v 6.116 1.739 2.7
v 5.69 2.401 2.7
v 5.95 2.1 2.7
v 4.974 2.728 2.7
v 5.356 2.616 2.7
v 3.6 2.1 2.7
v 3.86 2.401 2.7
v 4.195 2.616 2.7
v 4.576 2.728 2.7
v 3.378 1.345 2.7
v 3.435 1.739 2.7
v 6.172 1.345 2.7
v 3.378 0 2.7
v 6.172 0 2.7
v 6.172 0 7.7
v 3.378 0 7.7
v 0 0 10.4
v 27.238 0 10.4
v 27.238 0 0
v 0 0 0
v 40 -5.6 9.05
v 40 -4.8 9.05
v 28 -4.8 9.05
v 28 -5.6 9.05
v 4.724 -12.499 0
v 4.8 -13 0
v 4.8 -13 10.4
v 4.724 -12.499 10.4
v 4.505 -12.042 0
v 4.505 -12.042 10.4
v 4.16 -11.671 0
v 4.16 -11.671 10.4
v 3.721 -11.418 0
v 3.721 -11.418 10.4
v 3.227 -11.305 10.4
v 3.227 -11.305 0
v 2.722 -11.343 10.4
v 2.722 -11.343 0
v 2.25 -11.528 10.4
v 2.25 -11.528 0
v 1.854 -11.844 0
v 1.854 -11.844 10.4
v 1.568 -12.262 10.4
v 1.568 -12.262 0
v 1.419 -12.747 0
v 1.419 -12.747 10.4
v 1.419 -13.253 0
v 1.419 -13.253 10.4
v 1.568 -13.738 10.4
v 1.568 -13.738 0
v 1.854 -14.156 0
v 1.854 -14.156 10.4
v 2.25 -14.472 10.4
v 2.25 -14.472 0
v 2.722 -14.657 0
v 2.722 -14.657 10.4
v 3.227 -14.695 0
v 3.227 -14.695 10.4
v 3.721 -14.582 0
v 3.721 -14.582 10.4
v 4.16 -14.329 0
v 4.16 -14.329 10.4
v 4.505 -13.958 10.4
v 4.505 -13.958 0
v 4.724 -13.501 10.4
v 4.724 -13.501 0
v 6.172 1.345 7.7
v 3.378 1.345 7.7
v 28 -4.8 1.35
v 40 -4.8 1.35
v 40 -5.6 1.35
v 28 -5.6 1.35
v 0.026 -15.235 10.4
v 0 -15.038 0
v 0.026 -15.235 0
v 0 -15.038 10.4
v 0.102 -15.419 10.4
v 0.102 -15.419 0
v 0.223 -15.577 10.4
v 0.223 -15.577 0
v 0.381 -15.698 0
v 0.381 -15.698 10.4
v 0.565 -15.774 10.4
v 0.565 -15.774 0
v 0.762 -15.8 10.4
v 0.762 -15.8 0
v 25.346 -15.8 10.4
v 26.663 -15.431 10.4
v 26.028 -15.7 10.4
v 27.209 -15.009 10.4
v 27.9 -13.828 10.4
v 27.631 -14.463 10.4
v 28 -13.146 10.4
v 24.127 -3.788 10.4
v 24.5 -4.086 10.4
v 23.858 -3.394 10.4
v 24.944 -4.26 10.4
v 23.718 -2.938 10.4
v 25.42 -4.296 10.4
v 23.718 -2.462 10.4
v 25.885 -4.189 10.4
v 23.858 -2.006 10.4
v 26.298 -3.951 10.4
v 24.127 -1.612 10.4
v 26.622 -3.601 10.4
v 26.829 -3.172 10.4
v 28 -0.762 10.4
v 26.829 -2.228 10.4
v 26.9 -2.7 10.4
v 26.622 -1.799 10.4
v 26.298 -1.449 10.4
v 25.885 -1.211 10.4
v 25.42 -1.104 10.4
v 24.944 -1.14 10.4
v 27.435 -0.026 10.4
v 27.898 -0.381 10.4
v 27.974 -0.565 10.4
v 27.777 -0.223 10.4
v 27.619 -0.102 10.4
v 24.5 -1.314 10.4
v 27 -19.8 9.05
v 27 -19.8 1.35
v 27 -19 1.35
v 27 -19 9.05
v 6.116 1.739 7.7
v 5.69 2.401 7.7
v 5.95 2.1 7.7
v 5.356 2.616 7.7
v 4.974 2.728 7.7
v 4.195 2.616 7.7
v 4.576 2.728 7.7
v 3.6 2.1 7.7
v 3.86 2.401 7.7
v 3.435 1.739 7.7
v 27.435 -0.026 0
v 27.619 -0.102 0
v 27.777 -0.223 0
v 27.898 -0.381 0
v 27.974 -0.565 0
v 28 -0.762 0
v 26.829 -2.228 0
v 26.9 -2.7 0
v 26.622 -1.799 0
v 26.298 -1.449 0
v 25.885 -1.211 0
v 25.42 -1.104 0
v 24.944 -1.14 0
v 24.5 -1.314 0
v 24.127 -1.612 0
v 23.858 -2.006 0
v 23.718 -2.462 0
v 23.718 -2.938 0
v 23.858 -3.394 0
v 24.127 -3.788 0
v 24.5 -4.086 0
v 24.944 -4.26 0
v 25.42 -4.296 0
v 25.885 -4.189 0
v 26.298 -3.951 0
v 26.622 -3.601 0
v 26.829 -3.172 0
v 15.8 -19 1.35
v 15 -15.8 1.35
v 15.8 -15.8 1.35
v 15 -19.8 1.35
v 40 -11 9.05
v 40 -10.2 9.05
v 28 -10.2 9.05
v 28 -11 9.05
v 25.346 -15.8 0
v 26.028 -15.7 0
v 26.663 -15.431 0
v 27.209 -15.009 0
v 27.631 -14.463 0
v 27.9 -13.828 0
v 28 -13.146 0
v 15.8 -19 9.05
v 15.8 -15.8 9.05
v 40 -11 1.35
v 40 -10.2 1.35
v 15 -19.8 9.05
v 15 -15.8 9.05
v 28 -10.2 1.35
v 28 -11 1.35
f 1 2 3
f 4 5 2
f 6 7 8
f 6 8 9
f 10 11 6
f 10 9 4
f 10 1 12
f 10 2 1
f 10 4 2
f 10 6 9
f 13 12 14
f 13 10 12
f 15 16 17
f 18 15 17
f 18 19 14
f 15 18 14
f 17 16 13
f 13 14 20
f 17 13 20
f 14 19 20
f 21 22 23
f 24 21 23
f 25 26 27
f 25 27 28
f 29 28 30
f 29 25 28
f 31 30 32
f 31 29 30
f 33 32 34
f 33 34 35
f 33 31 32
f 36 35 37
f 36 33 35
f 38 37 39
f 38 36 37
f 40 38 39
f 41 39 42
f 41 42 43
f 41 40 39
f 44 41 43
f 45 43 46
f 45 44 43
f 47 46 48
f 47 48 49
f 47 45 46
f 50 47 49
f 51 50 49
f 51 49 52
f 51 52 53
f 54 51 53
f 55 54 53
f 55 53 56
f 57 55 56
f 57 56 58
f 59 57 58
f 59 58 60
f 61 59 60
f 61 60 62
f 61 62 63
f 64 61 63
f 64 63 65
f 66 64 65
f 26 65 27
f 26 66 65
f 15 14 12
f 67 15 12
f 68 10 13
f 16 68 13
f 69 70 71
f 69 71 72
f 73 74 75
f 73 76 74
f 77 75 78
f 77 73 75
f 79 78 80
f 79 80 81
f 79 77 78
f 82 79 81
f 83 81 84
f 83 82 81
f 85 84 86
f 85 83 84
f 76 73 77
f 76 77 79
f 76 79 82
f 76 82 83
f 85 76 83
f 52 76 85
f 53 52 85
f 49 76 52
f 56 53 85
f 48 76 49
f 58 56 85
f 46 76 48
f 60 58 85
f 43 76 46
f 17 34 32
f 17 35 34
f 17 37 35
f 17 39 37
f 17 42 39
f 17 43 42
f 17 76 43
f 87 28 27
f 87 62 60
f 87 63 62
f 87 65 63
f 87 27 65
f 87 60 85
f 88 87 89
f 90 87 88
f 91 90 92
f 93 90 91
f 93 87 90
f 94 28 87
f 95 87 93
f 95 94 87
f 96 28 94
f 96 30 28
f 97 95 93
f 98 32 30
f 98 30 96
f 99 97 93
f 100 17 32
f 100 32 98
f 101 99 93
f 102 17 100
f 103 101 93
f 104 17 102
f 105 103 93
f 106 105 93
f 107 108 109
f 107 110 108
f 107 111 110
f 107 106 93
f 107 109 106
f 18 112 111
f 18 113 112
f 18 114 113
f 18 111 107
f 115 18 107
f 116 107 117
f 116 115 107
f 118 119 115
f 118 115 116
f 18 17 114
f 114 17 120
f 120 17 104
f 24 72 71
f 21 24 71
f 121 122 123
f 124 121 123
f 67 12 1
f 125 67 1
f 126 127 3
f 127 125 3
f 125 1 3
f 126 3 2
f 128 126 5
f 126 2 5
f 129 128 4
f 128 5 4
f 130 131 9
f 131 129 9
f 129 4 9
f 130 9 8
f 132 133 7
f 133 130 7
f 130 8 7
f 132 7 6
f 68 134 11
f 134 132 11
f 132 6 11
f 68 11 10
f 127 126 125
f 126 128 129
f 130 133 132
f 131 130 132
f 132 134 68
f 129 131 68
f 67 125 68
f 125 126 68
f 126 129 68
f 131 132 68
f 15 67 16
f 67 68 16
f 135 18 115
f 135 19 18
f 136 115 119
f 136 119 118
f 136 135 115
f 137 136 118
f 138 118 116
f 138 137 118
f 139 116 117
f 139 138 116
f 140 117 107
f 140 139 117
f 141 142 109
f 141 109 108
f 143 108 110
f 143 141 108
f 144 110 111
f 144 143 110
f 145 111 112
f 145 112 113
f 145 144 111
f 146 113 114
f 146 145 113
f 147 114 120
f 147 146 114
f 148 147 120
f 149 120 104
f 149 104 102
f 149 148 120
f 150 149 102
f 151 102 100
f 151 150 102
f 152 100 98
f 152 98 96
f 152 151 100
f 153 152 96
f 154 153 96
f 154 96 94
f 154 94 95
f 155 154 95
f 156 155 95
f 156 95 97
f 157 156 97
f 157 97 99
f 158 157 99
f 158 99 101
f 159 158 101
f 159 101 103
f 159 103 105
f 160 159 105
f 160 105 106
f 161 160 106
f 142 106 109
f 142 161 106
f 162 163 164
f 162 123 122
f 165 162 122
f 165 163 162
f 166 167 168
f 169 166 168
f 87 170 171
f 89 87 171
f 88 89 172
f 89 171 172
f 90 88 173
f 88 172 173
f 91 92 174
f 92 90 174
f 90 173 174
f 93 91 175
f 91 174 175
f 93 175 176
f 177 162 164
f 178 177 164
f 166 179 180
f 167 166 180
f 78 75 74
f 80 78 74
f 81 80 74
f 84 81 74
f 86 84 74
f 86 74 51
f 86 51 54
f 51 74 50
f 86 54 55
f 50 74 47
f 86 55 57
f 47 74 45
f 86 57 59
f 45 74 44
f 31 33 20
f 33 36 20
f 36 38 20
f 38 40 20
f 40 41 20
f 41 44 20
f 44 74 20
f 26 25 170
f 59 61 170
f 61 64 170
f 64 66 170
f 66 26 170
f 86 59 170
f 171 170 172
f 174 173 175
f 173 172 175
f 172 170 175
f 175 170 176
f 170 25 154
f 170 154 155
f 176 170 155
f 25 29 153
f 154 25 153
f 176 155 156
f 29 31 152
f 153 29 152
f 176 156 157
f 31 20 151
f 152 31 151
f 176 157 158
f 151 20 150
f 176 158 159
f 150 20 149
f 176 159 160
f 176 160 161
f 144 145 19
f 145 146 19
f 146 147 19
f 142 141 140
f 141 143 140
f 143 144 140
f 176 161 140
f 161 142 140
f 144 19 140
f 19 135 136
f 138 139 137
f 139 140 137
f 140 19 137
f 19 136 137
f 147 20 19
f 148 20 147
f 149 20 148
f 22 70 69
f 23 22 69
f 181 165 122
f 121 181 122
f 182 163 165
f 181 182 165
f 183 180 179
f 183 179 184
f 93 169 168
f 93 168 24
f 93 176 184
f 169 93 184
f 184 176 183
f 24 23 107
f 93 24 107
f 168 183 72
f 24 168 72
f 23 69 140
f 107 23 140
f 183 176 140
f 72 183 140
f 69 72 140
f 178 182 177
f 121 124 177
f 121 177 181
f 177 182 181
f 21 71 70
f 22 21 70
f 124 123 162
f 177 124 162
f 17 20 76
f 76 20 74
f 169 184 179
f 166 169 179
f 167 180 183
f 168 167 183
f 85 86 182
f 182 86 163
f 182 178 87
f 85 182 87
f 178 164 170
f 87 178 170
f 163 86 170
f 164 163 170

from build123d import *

# Parameters (mm, degrees)
F0_R        = 1.7
F0_R_2      = 1.6
F1_DEPTH    = 10.4
F2_W        = 12.7
F2_H        = 2.7
F2_W_2      = 4
F2_H_2      = 1.35
F3_DEPTH    = 28
F4_W        = 12
F4_H        = 1.35
F5_DEPTH    = 6.2
F6_T1_DEPTH = 23.9048285752
F7_R        = 0.762


# Not quite as in the source:
# - a fillet or chamfer that OpenCascade refuses, or shapes differently, is made with other operations: its cross-section is extruded or revolved along the edge and cut away or added
# - a feature names something its author has since deleted; it is built from what else it names


with BuildPart() as f1:
    # F0 (on Top) → F1 (new body)
    with BuildSketch(Plane.XY):
        with BuildLine():
            Line((3.3782, 0), (0, 0))
            Line((0, 0), (0, -15.8))
            Line((0, -15.8), (15, -15.8))
            Line((15, -15.8), (15, -19.8))
            Line((15, -19.8), (27, -19.8))
            Line((27, -19.8), (27, -19))
            Line((27, -19), (15.8, -19))
            Line((15.8, -19), (15.8, -15.8))
            Line((15.8, -15.8), (28, -15.8))
            Line((28, -15.8), (28, -11))
            Line((28, -11), (40, -11))
            Line((40, -11), (40, -10.2))
            Line((40, -10.2), (28, -10.2))
            Line((28, -10.2), (28, -5.6))
            Line((28, -5.6), (40, -5.6))
            Line((40, -5.6), (40, -4.8))
            Line((40, -4.8), (28, -4.8))
            Line((28, -4.8), (28, 0))
            Line((28, 0), (6.1722, 0))
            Line((6.1722, 0), (6.1722, 1.345))
            ThreePointArc((6.1722, 1.345), (4.7752, 2.742), (3.3782, 1.345))
            Line((3.3782, 1.345), (3.3782, 0))
        make_face()
        with Locations((3.1, -13)):
            Circle(F0_R, mode=Mode.SUBTRACT)
        with Locations((25.3, -2.7)):
            Circle(F0_R_2, mode=Mode.SUBTRACT)
    extrude(amount=F1_DEPTH)

    # F2 (on face) → F3 (cut, through all)
    with BuildSketch(Plane(origin=(0, 0, 0), x_dir=(0, -1, 0), z_dir=(-1, 0, 0))):
        with Locations((-6.35, 9.05)):
            Rectangle(F2_W, F2_H)
        with Locations((-6.35, 1.35)):
            Rectangle(F2_W, F2_H)
        with Locations((17.8, 9.725)):
            Rectangle(F2_W_2, F2_H_2)
        with Locations((17.8, 0.675)):
            Rectangle(F2_W_2, F2_H_2)
    extrude(amount=-F3_DEPTH, mode=Mode.SUBTRACT)

    # F4 (on face) → F5 (cut, through all)
    with BuildSketch(Plane(origin=(0, -4.8, 0), x_dir=(-1, 0, 0), z_dir=(0, 1, 0))):
        with Locations((-34, 9.725)):
            Rectangle(F4_W, F4_H)
        with Locations((-34, 0.675)):
            Rectangle(F4_W, F4_H)
    extrude(amount=-F5_DEPTH, mode=Mode.SUBTRACT)

    # F6: fillet of radius 2.7 on 2 edges, made by hand

    # F6_s2 → F6_t1 (cut)
    with BuildSketch(Plane.XY.offset(-6.7524142876)):
        with BuildLine():
            ThreePointArc((25.2990343146, -15.8004), (27.2091883092, -15.0091883092), (28.0004, -13.0990343146))
            Line((28.0004, -13.0990343146), (28.2705365685, -13.0990343146))
            ThreePointArc((28.2705365685, -13.0990343146), (28.2701365685, -14.4495171573), (28.2701365685, -15.8))
            Line((28.2701365685, -15.8), (28, -16.0701365685))
            ThreePointArc((28, -16.0701365685), (26.6495171573, -16.0701365685), (25.2990343146, -16.0705365685))
            Line((25.2990343146, -16.0705365685), (25.2990343146, -15.8004))
        make_face()
    extrude(amount=F6_T1_DEPTH, mode=Mode.SUBTRACT)

    # F7
    f7_edges = [f1.edges().sort_by_distance(p)[0] for p in [
        (28, 0, 5.2),
        (0, -15.8, 5.2),
    ]]
    fillet(f7_edges, radius=F7_R)


solid = f1.part
